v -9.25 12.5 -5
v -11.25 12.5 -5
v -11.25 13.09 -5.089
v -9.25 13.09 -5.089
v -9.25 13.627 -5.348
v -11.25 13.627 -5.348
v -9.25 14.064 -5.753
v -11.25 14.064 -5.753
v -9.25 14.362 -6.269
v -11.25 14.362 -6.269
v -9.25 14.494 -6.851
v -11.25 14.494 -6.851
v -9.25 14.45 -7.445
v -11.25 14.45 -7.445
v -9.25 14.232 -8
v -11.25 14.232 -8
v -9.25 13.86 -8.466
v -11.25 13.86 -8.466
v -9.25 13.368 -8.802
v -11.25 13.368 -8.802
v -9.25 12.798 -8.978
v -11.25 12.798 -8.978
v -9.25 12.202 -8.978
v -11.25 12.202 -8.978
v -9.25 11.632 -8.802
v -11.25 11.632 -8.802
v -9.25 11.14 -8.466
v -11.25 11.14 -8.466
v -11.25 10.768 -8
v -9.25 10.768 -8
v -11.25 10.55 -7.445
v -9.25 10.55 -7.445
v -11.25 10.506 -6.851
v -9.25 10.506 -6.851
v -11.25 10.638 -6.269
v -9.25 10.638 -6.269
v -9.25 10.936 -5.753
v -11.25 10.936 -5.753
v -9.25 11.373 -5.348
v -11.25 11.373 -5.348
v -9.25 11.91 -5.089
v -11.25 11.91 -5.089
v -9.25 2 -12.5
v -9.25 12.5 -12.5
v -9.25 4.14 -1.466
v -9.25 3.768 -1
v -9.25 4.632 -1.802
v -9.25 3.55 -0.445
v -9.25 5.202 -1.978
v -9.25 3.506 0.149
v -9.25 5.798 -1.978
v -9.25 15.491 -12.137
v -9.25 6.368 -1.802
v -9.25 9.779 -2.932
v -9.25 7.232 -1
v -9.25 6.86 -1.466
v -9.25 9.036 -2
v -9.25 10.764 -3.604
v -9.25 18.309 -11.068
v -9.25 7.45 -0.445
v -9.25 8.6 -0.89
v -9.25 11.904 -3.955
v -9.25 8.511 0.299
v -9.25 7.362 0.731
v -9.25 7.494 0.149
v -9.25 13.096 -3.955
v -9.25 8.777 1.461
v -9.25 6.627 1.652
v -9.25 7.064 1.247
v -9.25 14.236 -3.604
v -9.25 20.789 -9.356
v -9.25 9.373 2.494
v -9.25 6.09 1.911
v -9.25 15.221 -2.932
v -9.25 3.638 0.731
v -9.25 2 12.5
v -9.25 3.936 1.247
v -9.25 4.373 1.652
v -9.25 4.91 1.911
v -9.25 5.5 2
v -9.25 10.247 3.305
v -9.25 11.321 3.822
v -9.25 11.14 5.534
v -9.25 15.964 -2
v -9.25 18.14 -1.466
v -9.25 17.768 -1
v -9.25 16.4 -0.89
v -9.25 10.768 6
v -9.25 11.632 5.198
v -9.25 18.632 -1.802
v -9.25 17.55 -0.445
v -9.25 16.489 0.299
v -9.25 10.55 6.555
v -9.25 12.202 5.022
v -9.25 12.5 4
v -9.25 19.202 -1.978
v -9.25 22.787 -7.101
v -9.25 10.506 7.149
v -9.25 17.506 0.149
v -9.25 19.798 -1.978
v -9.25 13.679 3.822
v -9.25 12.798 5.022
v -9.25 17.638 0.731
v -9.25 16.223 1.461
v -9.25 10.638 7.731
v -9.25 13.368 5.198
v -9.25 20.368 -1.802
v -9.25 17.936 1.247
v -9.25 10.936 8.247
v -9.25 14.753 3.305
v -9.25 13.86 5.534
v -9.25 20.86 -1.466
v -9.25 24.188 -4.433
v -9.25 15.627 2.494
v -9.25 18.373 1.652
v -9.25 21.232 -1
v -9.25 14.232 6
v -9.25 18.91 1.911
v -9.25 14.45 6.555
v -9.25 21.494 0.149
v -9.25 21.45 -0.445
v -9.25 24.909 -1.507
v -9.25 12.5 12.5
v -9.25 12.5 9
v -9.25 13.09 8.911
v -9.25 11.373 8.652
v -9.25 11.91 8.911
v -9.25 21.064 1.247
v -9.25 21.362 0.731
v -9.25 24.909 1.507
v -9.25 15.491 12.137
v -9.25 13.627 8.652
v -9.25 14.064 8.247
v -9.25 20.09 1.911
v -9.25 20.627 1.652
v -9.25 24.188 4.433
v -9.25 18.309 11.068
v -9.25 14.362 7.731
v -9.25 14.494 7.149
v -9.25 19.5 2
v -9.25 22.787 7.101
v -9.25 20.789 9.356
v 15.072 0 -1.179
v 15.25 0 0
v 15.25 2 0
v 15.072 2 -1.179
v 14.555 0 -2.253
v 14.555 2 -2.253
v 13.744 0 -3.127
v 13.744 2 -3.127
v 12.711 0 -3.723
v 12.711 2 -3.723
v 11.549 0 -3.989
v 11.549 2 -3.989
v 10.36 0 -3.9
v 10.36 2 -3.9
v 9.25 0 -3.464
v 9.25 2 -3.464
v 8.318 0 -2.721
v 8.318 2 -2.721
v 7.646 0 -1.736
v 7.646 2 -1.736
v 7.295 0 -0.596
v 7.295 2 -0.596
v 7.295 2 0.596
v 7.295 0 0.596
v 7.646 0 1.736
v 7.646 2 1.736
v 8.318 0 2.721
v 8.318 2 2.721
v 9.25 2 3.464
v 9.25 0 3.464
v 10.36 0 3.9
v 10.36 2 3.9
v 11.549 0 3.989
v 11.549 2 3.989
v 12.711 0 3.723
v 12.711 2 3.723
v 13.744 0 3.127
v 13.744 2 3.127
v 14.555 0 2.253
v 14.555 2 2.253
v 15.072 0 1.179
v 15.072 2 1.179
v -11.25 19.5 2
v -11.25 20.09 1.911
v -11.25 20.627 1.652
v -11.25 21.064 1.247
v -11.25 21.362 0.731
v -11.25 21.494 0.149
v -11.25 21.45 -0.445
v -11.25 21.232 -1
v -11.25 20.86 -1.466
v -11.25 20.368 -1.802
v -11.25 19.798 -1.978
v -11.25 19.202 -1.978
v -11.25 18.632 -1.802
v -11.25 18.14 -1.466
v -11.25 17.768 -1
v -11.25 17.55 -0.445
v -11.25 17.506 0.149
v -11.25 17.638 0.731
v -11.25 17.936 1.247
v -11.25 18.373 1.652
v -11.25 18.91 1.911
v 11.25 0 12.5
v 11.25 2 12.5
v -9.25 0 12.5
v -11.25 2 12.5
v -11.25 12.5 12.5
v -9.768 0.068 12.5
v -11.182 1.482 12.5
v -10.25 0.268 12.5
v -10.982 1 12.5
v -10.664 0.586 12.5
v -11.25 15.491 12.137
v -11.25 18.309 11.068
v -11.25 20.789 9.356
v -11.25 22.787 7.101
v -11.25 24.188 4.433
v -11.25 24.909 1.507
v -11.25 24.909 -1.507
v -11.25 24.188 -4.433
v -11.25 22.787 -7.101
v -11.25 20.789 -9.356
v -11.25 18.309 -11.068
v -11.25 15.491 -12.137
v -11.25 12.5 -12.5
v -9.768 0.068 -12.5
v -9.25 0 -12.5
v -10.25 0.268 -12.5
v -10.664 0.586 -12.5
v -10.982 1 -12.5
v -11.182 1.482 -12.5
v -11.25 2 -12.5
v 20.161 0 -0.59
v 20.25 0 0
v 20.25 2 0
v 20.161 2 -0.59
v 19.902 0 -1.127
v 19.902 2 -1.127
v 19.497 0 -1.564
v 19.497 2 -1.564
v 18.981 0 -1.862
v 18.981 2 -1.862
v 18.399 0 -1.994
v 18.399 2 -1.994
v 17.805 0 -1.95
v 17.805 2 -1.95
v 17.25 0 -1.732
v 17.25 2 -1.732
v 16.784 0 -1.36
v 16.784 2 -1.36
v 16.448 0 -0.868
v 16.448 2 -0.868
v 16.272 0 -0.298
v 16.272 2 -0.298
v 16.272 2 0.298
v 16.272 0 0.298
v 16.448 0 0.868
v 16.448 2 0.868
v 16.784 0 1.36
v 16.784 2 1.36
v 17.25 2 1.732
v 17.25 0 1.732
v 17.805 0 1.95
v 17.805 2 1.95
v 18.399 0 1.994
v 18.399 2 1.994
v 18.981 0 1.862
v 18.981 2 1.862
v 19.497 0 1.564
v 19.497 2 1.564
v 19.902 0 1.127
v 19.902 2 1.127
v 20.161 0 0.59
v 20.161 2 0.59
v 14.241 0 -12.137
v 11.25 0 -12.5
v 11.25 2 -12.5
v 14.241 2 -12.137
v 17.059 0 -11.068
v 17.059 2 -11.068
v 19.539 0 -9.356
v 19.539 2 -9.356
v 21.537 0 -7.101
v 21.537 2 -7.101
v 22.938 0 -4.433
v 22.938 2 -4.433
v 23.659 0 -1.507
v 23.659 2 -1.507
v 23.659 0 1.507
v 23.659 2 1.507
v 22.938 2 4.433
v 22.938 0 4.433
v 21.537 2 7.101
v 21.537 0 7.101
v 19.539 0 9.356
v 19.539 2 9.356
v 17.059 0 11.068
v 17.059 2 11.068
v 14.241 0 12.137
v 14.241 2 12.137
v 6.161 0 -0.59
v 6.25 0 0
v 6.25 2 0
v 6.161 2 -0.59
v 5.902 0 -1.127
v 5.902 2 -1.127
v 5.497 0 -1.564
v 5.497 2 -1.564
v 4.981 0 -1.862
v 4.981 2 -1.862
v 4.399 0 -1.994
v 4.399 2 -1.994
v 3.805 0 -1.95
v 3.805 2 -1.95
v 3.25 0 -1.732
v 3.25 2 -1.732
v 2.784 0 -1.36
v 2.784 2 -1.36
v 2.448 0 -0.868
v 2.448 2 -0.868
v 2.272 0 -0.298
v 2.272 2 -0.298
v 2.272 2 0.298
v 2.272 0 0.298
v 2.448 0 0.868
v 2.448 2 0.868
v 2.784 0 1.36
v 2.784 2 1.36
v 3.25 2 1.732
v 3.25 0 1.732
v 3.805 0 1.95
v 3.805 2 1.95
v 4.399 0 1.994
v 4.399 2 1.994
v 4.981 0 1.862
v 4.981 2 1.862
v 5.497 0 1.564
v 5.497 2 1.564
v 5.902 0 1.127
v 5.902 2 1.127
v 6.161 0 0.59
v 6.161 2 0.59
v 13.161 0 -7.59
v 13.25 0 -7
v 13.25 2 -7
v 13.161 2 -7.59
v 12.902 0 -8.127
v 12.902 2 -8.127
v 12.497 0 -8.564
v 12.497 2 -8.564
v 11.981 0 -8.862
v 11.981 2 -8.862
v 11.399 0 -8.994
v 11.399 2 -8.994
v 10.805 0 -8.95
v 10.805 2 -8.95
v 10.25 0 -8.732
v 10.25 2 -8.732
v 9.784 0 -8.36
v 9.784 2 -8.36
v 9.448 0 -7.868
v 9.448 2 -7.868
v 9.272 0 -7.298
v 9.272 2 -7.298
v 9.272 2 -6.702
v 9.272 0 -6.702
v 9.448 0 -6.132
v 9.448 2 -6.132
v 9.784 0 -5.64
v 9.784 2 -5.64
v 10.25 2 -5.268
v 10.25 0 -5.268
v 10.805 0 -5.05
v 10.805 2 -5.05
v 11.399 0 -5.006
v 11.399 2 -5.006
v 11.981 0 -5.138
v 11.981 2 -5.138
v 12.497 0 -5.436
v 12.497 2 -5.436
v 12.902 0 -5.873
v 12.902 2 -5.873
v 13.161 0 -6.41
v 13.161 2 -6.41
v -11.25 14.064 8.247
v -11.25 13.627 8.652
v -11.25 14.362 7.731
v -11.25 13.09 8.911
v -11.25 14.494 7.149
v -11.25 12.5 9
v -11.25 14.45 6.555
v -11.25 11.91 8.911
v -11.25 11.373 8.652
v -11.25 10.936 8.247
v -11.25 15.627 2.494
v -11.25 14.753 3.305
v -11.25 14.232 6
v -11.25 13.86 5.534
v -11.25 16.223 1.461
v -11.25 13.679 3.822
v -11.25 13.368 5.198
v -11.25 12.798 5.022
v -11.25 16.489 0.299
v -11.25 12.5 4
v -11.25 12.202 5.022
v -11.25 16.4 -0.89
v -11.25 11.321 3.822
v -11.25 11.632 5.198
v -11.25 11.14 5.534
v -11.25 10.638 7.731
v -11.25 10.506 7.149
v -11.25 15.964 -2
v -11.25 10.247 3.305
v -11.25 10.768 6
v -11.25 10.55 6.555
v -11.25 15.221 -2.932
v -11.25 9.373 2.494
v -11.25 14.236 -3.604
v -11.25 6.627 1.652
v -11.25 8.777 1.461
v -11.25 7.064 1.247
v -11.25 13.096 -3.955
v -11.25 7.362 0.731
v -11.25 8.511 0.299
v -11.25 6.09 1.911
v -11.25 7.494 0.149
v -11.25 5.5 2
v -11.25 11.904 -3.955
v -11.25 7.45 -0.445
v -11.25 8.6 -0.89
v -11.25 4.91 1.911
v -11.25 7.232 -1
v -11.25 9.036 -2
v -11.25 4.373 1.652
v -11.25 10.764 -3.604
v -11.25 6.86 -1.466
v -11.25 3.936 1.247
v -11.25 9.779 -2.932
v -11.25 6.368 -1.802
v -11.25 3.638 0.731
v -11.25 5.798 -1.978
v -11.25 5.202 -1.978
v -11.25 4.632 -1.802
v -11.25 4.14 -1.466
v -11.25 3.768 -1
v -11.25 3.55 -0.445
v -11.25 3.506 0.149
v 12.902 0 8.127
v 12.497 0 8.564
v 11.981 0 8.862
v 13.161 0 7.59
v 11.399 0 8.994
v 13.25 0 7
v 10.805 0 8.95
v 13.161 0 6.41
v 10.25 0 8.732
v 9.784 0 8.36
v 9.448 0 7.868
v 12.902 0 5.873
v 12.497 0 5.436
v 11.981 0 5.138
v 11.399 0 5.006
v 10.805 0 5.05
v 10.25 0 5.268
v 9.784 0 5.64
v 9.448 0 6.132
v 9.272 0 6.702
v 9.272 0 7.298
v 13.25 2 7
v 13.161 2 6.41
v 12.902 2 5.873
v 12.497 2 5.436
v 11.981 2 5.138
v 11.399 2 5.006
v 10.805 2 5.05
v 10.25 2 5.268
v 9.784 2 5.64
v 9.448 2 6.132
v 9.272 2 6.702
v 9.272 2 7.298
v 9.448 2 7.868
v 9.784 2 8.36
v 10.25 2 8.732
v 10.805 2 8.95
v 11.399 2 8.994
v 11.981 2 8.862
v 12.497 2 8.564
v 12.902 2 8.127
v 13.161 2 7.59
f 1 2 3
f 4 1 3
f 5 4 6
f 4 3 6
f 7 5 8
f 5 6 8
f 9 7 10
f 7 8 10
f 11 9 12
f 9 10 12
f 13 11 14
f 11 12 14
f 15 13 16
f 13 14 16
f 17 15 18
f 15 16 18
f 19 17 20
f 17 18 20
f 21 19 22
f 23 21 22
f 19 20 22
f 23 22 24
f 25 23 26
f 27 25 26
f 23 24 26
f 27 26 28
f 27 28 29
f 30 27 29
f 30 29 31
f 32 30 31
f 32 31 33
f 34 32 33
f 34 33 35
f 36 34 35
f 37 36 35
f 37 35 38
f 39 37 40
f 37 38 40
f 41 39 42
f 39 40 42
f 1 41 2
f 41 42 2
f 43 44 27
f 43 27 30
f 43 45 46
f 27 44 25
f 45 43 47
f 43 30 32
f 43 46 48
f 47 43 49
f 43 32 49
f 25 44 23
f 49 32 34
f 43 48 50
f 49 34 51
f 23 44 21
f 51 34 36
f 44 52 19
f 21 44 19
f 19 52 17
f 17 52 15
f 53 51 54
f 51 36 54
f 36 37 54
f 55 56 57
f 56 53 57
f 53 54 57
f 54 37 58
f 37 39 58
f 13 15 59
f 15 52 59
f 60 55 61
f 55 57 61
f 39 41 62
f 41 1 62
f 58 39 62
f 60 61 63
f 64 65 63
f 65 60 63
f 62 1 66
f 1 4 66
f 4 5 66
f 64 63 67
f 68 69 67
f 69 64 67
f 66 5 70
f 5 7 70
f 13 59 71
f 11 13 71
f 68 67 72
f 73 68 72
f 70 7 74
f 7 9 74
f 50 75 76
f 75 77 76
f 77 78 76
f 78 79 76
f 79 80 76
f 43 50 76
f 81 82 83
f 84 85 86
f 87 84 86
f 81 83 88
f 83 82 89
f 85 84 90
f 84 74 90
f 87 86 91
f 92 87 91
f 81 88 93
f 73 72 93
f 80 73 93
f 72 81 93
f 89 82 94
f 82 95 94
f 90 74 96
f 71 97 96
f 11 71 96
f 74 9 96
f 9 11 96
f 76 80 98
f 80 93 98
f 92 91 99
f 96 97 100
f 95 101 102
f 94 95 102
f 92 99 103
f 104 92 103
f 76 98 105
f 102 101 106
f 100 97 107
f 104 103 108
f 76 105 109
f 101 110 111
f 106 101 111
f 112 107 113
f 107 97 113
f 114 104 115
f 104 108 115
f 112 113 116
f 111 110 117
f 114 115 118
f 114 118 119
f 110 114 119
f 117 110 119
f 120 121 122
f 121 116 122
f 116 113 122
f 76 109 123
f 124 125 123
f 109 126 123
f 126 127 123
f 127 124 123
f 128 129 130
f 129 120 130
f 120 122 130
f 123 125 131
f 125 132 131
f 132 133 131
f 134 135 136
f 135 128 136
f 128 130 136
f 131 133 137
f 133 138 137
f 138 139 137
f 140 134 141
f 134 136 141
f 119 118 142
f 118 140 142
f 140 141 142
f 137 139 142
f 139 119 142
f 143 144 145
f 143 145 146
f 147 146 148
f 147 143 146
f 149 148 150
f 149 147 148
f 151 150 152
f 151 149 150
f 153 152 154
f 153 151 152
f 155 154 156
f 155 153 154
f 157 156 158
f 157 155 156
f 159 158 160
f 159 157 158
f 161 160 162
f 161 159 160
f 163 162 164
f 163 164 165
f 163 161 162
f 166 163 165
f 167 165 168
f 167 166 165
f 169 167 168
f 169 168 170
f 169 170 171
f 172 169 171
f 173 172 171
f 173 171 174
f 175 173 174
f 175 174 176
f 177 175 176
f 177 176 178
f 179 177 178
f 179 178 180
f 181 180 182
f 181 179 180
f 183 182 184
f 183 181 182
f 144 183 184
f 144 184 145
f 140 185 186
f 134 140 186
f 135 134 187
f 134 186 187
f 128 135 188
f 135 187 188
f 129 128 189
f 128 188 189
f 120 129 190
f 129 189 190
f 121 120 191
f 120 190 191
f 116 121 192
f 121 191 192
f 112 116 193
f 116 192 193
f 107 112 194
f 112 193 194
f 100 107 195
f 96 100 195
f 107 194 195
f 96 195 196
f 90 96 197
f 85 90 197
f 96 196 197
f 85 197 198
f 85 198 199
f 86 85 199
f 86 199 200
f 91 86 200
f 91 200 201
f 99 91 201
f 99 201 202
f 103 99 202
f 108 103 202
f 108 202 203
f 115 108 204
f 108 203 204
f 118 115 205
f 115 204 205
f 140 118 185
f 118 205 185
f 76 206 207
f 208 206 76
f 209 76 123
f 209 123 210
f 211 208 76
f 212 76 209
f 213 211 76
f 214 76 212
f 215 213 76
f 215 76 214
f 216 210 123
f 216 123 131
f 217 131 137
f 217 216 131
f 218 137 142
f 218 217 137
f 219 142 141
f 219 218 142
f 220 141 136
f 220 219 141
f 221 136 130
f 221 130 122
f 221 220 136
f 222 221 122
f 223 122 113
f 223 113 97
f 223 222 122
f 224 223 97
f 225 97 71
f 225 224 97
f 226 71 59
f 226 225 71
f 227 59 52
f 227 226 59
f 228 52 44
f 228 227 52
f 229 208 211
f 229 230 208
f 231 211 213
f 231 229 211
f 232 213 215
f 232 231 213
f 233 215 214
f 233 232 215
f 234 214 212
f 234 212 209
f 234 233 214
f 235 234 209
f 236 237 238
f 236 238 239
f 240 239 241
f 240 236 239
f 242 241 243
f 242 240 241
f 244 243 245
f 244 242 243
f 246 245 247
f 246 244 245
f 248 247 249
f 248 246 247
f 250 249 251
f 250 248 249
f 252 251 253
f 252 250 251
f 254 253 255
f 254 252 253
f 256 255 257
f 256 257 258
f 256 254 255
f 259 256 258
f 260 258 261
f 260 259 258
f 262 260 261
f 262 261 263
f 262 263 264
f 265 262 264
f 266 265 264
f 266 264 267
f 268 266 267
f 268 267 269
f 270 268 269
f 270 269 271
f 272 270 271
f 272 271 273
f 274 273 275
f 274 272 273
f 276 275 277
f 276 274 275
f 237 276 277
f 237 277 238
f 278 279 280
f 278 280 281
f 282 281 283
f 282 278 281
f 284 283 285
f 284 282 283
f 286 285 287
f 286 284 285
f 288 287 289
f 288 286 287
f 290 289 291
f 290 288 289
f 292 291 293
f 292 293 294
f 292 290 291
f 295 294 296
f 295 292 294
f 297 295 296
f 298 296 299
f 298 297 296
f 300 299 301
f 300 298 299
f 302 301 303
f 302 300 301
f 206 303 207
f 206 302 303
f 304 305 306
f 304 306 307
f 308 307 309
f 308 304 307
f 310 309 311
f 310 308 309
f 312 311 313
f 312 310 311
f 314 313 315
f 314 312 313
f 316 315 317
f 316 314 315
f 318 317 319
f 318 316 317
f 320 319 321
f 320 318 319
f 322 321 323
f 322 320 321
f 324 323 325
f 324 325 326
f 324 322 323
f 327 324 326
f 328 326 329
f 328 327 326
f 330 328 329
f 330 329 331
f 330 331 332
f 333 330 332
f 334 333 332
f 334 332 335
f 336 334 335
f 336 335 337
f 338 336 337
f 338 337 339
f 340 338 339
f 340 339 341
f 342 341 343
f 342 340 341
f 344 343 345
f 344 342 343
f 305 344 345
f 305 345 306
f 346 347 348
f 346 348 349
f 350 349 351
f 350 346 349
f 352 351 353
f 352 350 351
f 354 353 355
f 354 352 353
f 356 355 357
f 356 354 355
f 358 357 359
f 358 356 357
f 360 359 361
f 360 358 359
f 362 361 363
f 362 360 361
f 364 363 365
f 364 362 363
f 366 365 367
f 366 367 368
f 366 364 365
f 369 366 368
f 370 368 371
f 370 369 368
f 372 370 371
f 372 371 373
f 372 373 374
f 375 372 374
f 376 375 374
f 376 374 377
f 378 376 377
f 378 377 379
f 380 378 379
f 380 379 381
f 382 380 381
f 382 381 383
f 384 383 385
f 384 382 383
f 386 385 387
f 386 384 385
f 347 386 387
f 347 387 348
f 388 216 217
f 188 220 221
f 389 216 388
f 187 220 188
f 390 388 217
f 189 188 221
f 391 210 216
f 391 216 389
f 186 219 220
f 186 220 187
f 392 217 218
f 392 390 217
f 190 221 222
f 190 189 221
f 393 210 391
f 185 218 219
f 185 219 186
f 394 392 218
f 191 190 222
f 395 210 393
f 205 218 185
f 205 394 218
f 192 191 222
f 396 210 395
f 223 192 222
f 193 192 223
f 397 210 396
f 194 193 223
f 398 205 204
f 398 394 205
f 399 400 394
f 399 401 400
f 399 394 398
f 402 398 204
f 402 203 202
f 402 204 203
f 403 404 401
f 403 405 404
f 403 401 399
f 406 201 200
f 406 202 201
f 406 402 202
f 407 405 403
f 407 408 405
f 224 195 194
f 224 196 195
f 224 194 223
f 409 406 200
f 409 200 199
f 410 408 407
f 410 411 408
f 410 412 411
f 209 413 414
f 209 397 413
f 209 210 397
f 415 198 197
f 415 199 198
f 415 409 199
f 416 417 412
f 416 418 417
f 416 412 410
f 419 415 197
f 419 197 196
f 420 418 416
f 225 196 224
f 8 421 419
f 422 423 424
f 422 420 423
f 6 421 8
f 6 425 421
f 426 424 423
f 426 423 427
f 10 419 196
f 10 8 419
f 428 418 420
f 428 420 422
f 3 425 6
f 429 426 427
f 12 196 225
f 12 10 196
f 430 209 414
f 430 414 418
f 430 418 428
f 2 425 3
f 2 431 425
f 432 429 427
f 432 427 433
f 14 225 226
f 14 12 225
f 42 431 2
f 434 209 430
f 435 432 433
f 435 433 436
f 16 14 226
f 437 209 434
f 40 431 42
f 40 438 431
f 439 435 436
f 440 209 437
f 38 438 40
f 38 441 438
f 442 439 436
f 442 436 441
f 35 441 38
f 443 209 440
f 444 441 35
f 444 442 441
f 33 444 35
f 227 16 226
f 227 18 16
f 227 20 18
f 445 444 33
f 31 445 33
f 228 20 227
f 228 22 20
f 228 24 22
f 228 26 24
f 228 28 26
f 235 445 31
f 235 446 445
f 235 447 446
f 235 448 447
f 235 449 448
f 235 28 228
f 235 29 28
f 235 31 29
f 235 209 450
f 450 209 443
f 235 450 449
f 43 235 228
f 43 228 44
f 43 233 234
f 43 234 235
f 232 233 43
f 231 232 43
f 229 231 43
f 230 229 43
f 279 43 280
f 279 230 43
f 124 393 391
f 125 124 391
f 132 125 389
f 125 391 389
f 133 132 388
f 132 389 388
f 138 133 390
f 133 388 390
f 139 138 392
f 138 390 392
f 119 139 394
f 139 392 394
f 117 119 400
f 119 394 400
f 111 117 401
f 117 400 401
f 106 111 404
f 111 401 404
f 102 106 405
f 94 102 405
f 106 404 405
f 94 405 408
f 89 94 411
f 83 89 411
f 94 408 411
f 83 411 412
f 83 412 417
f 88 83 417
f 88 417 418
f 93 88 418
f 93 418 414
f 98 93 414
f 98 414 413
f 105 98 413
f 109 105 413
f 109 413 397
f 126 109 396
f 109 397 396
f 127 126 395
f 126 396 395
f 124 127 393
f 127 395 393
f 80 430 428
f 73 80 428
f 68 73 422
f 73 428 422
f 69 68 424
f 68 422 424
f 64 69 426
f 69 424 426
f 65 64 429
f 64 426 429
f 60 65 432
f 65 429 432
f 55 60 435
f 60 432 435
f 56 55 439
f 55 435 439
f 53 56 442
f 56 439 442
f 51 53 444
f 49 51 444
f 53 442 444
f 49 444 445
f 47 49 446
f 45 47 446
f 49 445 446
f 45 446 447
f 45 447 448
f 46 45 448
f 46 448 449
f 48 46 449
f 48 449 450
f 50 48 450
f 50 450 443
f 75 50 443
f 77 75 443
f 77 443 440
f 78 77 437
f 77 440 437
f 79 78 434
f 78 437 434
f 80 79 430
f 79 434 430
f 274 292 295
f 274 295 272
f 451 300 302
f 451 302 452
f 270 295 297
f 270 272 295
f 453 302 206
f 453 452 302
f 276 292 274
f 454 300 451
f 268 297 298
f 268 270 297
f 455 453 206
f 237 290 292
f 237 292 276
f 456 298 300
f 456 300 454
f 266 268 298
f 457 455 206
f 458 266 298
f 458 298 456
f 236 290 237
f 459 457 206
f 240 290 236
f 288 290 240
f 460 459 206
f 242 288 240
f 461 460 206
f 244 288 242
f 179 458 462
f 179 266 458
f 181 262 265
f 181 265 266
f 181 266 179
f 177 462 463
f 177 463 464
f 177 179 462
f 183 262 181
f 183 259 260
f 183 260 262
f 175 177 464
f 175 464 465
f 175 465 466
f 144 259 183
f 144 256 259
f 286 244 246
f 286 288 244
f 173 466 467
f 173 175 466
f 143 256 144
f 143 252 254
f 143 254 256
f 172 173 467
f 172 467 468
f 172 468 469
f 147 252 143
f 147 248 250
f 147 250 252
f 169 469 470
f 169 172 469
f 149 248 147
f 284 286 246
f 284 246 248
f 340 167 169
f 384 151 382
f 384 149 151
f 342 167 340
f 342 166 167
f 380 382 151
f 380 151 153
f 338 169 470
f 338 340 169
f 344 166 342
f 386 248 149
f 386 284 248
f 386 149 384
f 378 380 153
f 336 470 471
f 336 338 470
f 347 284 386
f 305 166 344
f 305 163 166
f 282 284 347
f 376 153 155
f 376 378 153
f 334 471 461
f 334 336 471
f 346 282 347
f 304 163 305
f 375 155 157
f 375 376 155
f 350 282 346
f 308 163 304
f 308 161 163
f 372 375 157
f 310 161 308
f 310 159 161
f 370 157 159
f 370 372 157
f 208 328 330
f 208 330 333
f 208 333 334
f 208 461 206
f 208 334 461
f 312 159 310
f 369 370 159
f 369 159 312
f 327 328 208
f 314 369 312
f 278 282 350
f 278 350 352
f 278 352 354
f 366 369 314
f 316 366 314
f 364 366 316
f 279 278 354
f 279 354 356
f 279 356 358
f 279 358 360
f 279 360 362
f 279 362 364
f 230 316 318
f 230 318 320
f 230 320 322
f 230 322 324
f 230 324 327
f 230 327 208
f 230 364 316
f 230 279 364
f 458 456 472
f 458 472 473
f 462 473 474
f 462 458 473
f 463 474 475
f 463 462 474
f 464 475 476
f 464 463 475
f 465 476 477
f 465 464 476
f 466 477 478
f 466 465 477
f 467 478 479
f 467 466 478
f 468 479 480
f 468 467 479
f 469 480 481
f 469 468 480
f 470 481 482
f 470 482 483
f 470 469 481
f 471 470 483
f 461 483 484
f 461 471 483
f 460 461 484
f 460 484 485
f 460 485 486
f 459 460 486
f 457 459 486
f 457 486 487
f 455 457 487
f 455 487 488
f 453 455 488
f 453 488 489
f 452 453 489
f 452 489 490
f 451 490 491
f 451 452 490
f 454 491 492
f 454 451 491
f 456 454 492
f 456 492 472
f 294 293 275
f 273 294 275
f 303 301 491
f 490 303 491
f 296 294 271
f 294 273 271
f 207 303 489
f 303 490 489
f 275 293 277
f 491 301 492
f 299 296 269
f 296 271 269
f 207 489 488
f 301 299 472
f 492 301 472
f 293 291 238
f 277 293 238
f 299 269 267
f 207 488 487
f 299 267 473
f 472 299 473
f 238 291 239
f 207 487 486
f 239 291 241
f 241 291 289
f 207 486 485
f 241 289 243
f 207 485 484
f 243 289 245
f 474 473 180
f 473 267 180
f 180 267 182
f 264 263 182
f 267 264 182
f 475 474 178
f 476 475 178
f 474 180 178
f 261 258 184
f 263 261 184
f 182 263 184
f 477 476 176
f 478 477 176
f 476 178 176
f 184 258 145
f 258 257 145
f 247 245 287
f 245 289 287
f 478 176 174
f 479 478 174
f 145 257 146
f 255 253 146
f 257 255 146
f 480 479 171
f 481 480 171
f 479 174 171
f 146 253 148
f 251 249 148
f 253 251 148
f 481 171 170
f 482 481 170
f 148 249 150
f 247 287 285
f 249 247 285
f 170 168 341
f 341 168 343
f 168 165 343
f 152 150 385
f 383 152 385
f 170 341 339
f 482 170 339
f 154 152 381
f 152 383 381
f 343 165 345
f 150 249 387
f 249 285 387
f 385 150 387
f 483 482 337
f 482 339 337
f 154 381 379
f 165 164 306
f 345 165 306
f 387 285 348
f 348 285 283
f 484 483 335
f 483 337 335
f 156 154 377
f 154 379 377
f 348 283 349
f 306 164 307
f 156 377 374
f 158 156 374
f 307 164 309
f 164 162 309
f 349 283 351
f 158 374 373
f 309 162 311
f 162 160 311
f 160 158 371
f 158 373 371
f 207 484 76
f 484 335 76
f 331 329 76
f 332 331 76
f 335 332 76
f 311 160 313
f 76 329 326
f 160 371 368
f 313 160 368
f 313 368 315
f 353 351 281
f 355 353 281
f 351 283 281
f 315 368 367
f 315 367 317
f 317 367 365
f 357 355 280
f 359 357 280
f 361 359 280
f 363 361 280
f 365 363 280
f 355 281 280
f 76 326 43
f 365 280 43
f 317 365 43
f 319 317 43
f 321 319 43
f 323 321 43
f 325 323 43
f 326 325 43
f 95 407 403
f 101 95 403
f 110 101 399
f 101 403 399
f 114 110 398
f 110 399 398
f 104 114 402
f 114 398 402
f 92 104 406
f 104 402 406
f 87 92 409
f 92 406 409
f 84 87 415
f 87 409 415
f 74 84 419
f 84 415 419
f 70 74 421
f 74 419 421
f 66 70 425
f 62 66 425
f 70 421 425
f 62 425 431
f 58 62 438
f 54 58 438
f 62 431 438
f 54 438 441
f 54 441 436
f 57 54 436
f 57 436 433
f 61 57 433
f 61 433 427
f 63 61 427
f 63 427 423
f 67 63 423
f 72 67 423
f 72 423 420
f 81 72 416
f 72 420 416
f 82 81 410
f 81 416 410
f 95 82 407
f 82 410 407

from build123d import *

# Parameters (mm, degrees)
SKETCH_1_R      = 4
SKETCH_1_R_2    = 2
EXTRUDE_1_DEPTH = 2
SKETCH_2_R      = 4
SKETCH_2_R_2    = 2
EXTRUDE_2_DEPTH = 2
FILLET_1_R      = 2


with BuildPart() as part:
    # 草图1 → 凸台-拉伸1 (new body)
    with BuildSketch(Plane(origin=(0, 0, 0), x_dir=(1, 0, 0), z_dir=(0, 1, 0))):
        with BuildLine():
            Line((-11.25, 12.5), (11.25, 12.5))
            ThreePointArc((11.25, 12.5), (23.75, 0), (11.25, -12.5))
            Line((11.25, -12.5), (-11.25, -12.5))
            Line((-11.25, -12.5), (-11.25, 12.5))
        make_face()
        with Locations((11.25, 0)):
            Circle(SKETCH_1_R, mode=Mode.SUBTRACT)
        with Locations((18.25, 0)):
            Circle(SKETCH_1_R_2, mode=Mode.SUBTRACT)
        with Locations((11.25, -7)):
            Circle(SKETCH_1_R_2, mode=Mode.SUBTRACT)
        with Locations((4.25, 0)):
            Circle(SKETCH_1_R_2, mode=Mode.SUBTRACT)
        with Locations((11.25, 7)):
            Circle(SKETCH_1_R_2, mode=Mode.SUBTRACT)
    extrude(amount=EXTRUDE_1_DEPTH)

    # 草图2 → 凸台-拉伸2 (add)
    with BuildSketch(Plane.ZY.offset(11.25)):
        with BuildLine():
            Line((-12.5, 0), (12.5, 0))
            Line((12.5, 0), (12.5, 12.5))
            ThreePointArc((12.5, 12.5), (0, 25), (-12.5, 12.5))
            Line((-12.5, 12.5), (-12.5, 0))
        make_face()
        with Locations((0, 12.5)):
            Circle(SKETCH_2_R, mode=Mode.SUBTRACT)
        with Locations((0, 19.5)):
            Circle(SKETCH_2_R_2, mode=Mode.SUBTRACT)
        with Locations((7, 12.5)):
            Circle(SKETCH_2_R_2, mode=Mode.SUBTRACT)
        with Locations((0, 5.5)):
            Circle(SKETCH_2_R_2, mode=Mode.SUBTRACT)
        with Locations((-7, 12.5)):
            Circle(SKETCH_2_R_2, mode=Mode.SUBTRACT)
    extrude(amount=-EXTRUDE_2_DEPTH)

    # 圆角1
    fillet_1_edges = [part.edges().sort_by_distance(p)[0] for p in [
        (-11.25, 0, 0),
    ]]
    fillet(fillet_1_edges, radius=FILLET_1_R)


solid = part.part
